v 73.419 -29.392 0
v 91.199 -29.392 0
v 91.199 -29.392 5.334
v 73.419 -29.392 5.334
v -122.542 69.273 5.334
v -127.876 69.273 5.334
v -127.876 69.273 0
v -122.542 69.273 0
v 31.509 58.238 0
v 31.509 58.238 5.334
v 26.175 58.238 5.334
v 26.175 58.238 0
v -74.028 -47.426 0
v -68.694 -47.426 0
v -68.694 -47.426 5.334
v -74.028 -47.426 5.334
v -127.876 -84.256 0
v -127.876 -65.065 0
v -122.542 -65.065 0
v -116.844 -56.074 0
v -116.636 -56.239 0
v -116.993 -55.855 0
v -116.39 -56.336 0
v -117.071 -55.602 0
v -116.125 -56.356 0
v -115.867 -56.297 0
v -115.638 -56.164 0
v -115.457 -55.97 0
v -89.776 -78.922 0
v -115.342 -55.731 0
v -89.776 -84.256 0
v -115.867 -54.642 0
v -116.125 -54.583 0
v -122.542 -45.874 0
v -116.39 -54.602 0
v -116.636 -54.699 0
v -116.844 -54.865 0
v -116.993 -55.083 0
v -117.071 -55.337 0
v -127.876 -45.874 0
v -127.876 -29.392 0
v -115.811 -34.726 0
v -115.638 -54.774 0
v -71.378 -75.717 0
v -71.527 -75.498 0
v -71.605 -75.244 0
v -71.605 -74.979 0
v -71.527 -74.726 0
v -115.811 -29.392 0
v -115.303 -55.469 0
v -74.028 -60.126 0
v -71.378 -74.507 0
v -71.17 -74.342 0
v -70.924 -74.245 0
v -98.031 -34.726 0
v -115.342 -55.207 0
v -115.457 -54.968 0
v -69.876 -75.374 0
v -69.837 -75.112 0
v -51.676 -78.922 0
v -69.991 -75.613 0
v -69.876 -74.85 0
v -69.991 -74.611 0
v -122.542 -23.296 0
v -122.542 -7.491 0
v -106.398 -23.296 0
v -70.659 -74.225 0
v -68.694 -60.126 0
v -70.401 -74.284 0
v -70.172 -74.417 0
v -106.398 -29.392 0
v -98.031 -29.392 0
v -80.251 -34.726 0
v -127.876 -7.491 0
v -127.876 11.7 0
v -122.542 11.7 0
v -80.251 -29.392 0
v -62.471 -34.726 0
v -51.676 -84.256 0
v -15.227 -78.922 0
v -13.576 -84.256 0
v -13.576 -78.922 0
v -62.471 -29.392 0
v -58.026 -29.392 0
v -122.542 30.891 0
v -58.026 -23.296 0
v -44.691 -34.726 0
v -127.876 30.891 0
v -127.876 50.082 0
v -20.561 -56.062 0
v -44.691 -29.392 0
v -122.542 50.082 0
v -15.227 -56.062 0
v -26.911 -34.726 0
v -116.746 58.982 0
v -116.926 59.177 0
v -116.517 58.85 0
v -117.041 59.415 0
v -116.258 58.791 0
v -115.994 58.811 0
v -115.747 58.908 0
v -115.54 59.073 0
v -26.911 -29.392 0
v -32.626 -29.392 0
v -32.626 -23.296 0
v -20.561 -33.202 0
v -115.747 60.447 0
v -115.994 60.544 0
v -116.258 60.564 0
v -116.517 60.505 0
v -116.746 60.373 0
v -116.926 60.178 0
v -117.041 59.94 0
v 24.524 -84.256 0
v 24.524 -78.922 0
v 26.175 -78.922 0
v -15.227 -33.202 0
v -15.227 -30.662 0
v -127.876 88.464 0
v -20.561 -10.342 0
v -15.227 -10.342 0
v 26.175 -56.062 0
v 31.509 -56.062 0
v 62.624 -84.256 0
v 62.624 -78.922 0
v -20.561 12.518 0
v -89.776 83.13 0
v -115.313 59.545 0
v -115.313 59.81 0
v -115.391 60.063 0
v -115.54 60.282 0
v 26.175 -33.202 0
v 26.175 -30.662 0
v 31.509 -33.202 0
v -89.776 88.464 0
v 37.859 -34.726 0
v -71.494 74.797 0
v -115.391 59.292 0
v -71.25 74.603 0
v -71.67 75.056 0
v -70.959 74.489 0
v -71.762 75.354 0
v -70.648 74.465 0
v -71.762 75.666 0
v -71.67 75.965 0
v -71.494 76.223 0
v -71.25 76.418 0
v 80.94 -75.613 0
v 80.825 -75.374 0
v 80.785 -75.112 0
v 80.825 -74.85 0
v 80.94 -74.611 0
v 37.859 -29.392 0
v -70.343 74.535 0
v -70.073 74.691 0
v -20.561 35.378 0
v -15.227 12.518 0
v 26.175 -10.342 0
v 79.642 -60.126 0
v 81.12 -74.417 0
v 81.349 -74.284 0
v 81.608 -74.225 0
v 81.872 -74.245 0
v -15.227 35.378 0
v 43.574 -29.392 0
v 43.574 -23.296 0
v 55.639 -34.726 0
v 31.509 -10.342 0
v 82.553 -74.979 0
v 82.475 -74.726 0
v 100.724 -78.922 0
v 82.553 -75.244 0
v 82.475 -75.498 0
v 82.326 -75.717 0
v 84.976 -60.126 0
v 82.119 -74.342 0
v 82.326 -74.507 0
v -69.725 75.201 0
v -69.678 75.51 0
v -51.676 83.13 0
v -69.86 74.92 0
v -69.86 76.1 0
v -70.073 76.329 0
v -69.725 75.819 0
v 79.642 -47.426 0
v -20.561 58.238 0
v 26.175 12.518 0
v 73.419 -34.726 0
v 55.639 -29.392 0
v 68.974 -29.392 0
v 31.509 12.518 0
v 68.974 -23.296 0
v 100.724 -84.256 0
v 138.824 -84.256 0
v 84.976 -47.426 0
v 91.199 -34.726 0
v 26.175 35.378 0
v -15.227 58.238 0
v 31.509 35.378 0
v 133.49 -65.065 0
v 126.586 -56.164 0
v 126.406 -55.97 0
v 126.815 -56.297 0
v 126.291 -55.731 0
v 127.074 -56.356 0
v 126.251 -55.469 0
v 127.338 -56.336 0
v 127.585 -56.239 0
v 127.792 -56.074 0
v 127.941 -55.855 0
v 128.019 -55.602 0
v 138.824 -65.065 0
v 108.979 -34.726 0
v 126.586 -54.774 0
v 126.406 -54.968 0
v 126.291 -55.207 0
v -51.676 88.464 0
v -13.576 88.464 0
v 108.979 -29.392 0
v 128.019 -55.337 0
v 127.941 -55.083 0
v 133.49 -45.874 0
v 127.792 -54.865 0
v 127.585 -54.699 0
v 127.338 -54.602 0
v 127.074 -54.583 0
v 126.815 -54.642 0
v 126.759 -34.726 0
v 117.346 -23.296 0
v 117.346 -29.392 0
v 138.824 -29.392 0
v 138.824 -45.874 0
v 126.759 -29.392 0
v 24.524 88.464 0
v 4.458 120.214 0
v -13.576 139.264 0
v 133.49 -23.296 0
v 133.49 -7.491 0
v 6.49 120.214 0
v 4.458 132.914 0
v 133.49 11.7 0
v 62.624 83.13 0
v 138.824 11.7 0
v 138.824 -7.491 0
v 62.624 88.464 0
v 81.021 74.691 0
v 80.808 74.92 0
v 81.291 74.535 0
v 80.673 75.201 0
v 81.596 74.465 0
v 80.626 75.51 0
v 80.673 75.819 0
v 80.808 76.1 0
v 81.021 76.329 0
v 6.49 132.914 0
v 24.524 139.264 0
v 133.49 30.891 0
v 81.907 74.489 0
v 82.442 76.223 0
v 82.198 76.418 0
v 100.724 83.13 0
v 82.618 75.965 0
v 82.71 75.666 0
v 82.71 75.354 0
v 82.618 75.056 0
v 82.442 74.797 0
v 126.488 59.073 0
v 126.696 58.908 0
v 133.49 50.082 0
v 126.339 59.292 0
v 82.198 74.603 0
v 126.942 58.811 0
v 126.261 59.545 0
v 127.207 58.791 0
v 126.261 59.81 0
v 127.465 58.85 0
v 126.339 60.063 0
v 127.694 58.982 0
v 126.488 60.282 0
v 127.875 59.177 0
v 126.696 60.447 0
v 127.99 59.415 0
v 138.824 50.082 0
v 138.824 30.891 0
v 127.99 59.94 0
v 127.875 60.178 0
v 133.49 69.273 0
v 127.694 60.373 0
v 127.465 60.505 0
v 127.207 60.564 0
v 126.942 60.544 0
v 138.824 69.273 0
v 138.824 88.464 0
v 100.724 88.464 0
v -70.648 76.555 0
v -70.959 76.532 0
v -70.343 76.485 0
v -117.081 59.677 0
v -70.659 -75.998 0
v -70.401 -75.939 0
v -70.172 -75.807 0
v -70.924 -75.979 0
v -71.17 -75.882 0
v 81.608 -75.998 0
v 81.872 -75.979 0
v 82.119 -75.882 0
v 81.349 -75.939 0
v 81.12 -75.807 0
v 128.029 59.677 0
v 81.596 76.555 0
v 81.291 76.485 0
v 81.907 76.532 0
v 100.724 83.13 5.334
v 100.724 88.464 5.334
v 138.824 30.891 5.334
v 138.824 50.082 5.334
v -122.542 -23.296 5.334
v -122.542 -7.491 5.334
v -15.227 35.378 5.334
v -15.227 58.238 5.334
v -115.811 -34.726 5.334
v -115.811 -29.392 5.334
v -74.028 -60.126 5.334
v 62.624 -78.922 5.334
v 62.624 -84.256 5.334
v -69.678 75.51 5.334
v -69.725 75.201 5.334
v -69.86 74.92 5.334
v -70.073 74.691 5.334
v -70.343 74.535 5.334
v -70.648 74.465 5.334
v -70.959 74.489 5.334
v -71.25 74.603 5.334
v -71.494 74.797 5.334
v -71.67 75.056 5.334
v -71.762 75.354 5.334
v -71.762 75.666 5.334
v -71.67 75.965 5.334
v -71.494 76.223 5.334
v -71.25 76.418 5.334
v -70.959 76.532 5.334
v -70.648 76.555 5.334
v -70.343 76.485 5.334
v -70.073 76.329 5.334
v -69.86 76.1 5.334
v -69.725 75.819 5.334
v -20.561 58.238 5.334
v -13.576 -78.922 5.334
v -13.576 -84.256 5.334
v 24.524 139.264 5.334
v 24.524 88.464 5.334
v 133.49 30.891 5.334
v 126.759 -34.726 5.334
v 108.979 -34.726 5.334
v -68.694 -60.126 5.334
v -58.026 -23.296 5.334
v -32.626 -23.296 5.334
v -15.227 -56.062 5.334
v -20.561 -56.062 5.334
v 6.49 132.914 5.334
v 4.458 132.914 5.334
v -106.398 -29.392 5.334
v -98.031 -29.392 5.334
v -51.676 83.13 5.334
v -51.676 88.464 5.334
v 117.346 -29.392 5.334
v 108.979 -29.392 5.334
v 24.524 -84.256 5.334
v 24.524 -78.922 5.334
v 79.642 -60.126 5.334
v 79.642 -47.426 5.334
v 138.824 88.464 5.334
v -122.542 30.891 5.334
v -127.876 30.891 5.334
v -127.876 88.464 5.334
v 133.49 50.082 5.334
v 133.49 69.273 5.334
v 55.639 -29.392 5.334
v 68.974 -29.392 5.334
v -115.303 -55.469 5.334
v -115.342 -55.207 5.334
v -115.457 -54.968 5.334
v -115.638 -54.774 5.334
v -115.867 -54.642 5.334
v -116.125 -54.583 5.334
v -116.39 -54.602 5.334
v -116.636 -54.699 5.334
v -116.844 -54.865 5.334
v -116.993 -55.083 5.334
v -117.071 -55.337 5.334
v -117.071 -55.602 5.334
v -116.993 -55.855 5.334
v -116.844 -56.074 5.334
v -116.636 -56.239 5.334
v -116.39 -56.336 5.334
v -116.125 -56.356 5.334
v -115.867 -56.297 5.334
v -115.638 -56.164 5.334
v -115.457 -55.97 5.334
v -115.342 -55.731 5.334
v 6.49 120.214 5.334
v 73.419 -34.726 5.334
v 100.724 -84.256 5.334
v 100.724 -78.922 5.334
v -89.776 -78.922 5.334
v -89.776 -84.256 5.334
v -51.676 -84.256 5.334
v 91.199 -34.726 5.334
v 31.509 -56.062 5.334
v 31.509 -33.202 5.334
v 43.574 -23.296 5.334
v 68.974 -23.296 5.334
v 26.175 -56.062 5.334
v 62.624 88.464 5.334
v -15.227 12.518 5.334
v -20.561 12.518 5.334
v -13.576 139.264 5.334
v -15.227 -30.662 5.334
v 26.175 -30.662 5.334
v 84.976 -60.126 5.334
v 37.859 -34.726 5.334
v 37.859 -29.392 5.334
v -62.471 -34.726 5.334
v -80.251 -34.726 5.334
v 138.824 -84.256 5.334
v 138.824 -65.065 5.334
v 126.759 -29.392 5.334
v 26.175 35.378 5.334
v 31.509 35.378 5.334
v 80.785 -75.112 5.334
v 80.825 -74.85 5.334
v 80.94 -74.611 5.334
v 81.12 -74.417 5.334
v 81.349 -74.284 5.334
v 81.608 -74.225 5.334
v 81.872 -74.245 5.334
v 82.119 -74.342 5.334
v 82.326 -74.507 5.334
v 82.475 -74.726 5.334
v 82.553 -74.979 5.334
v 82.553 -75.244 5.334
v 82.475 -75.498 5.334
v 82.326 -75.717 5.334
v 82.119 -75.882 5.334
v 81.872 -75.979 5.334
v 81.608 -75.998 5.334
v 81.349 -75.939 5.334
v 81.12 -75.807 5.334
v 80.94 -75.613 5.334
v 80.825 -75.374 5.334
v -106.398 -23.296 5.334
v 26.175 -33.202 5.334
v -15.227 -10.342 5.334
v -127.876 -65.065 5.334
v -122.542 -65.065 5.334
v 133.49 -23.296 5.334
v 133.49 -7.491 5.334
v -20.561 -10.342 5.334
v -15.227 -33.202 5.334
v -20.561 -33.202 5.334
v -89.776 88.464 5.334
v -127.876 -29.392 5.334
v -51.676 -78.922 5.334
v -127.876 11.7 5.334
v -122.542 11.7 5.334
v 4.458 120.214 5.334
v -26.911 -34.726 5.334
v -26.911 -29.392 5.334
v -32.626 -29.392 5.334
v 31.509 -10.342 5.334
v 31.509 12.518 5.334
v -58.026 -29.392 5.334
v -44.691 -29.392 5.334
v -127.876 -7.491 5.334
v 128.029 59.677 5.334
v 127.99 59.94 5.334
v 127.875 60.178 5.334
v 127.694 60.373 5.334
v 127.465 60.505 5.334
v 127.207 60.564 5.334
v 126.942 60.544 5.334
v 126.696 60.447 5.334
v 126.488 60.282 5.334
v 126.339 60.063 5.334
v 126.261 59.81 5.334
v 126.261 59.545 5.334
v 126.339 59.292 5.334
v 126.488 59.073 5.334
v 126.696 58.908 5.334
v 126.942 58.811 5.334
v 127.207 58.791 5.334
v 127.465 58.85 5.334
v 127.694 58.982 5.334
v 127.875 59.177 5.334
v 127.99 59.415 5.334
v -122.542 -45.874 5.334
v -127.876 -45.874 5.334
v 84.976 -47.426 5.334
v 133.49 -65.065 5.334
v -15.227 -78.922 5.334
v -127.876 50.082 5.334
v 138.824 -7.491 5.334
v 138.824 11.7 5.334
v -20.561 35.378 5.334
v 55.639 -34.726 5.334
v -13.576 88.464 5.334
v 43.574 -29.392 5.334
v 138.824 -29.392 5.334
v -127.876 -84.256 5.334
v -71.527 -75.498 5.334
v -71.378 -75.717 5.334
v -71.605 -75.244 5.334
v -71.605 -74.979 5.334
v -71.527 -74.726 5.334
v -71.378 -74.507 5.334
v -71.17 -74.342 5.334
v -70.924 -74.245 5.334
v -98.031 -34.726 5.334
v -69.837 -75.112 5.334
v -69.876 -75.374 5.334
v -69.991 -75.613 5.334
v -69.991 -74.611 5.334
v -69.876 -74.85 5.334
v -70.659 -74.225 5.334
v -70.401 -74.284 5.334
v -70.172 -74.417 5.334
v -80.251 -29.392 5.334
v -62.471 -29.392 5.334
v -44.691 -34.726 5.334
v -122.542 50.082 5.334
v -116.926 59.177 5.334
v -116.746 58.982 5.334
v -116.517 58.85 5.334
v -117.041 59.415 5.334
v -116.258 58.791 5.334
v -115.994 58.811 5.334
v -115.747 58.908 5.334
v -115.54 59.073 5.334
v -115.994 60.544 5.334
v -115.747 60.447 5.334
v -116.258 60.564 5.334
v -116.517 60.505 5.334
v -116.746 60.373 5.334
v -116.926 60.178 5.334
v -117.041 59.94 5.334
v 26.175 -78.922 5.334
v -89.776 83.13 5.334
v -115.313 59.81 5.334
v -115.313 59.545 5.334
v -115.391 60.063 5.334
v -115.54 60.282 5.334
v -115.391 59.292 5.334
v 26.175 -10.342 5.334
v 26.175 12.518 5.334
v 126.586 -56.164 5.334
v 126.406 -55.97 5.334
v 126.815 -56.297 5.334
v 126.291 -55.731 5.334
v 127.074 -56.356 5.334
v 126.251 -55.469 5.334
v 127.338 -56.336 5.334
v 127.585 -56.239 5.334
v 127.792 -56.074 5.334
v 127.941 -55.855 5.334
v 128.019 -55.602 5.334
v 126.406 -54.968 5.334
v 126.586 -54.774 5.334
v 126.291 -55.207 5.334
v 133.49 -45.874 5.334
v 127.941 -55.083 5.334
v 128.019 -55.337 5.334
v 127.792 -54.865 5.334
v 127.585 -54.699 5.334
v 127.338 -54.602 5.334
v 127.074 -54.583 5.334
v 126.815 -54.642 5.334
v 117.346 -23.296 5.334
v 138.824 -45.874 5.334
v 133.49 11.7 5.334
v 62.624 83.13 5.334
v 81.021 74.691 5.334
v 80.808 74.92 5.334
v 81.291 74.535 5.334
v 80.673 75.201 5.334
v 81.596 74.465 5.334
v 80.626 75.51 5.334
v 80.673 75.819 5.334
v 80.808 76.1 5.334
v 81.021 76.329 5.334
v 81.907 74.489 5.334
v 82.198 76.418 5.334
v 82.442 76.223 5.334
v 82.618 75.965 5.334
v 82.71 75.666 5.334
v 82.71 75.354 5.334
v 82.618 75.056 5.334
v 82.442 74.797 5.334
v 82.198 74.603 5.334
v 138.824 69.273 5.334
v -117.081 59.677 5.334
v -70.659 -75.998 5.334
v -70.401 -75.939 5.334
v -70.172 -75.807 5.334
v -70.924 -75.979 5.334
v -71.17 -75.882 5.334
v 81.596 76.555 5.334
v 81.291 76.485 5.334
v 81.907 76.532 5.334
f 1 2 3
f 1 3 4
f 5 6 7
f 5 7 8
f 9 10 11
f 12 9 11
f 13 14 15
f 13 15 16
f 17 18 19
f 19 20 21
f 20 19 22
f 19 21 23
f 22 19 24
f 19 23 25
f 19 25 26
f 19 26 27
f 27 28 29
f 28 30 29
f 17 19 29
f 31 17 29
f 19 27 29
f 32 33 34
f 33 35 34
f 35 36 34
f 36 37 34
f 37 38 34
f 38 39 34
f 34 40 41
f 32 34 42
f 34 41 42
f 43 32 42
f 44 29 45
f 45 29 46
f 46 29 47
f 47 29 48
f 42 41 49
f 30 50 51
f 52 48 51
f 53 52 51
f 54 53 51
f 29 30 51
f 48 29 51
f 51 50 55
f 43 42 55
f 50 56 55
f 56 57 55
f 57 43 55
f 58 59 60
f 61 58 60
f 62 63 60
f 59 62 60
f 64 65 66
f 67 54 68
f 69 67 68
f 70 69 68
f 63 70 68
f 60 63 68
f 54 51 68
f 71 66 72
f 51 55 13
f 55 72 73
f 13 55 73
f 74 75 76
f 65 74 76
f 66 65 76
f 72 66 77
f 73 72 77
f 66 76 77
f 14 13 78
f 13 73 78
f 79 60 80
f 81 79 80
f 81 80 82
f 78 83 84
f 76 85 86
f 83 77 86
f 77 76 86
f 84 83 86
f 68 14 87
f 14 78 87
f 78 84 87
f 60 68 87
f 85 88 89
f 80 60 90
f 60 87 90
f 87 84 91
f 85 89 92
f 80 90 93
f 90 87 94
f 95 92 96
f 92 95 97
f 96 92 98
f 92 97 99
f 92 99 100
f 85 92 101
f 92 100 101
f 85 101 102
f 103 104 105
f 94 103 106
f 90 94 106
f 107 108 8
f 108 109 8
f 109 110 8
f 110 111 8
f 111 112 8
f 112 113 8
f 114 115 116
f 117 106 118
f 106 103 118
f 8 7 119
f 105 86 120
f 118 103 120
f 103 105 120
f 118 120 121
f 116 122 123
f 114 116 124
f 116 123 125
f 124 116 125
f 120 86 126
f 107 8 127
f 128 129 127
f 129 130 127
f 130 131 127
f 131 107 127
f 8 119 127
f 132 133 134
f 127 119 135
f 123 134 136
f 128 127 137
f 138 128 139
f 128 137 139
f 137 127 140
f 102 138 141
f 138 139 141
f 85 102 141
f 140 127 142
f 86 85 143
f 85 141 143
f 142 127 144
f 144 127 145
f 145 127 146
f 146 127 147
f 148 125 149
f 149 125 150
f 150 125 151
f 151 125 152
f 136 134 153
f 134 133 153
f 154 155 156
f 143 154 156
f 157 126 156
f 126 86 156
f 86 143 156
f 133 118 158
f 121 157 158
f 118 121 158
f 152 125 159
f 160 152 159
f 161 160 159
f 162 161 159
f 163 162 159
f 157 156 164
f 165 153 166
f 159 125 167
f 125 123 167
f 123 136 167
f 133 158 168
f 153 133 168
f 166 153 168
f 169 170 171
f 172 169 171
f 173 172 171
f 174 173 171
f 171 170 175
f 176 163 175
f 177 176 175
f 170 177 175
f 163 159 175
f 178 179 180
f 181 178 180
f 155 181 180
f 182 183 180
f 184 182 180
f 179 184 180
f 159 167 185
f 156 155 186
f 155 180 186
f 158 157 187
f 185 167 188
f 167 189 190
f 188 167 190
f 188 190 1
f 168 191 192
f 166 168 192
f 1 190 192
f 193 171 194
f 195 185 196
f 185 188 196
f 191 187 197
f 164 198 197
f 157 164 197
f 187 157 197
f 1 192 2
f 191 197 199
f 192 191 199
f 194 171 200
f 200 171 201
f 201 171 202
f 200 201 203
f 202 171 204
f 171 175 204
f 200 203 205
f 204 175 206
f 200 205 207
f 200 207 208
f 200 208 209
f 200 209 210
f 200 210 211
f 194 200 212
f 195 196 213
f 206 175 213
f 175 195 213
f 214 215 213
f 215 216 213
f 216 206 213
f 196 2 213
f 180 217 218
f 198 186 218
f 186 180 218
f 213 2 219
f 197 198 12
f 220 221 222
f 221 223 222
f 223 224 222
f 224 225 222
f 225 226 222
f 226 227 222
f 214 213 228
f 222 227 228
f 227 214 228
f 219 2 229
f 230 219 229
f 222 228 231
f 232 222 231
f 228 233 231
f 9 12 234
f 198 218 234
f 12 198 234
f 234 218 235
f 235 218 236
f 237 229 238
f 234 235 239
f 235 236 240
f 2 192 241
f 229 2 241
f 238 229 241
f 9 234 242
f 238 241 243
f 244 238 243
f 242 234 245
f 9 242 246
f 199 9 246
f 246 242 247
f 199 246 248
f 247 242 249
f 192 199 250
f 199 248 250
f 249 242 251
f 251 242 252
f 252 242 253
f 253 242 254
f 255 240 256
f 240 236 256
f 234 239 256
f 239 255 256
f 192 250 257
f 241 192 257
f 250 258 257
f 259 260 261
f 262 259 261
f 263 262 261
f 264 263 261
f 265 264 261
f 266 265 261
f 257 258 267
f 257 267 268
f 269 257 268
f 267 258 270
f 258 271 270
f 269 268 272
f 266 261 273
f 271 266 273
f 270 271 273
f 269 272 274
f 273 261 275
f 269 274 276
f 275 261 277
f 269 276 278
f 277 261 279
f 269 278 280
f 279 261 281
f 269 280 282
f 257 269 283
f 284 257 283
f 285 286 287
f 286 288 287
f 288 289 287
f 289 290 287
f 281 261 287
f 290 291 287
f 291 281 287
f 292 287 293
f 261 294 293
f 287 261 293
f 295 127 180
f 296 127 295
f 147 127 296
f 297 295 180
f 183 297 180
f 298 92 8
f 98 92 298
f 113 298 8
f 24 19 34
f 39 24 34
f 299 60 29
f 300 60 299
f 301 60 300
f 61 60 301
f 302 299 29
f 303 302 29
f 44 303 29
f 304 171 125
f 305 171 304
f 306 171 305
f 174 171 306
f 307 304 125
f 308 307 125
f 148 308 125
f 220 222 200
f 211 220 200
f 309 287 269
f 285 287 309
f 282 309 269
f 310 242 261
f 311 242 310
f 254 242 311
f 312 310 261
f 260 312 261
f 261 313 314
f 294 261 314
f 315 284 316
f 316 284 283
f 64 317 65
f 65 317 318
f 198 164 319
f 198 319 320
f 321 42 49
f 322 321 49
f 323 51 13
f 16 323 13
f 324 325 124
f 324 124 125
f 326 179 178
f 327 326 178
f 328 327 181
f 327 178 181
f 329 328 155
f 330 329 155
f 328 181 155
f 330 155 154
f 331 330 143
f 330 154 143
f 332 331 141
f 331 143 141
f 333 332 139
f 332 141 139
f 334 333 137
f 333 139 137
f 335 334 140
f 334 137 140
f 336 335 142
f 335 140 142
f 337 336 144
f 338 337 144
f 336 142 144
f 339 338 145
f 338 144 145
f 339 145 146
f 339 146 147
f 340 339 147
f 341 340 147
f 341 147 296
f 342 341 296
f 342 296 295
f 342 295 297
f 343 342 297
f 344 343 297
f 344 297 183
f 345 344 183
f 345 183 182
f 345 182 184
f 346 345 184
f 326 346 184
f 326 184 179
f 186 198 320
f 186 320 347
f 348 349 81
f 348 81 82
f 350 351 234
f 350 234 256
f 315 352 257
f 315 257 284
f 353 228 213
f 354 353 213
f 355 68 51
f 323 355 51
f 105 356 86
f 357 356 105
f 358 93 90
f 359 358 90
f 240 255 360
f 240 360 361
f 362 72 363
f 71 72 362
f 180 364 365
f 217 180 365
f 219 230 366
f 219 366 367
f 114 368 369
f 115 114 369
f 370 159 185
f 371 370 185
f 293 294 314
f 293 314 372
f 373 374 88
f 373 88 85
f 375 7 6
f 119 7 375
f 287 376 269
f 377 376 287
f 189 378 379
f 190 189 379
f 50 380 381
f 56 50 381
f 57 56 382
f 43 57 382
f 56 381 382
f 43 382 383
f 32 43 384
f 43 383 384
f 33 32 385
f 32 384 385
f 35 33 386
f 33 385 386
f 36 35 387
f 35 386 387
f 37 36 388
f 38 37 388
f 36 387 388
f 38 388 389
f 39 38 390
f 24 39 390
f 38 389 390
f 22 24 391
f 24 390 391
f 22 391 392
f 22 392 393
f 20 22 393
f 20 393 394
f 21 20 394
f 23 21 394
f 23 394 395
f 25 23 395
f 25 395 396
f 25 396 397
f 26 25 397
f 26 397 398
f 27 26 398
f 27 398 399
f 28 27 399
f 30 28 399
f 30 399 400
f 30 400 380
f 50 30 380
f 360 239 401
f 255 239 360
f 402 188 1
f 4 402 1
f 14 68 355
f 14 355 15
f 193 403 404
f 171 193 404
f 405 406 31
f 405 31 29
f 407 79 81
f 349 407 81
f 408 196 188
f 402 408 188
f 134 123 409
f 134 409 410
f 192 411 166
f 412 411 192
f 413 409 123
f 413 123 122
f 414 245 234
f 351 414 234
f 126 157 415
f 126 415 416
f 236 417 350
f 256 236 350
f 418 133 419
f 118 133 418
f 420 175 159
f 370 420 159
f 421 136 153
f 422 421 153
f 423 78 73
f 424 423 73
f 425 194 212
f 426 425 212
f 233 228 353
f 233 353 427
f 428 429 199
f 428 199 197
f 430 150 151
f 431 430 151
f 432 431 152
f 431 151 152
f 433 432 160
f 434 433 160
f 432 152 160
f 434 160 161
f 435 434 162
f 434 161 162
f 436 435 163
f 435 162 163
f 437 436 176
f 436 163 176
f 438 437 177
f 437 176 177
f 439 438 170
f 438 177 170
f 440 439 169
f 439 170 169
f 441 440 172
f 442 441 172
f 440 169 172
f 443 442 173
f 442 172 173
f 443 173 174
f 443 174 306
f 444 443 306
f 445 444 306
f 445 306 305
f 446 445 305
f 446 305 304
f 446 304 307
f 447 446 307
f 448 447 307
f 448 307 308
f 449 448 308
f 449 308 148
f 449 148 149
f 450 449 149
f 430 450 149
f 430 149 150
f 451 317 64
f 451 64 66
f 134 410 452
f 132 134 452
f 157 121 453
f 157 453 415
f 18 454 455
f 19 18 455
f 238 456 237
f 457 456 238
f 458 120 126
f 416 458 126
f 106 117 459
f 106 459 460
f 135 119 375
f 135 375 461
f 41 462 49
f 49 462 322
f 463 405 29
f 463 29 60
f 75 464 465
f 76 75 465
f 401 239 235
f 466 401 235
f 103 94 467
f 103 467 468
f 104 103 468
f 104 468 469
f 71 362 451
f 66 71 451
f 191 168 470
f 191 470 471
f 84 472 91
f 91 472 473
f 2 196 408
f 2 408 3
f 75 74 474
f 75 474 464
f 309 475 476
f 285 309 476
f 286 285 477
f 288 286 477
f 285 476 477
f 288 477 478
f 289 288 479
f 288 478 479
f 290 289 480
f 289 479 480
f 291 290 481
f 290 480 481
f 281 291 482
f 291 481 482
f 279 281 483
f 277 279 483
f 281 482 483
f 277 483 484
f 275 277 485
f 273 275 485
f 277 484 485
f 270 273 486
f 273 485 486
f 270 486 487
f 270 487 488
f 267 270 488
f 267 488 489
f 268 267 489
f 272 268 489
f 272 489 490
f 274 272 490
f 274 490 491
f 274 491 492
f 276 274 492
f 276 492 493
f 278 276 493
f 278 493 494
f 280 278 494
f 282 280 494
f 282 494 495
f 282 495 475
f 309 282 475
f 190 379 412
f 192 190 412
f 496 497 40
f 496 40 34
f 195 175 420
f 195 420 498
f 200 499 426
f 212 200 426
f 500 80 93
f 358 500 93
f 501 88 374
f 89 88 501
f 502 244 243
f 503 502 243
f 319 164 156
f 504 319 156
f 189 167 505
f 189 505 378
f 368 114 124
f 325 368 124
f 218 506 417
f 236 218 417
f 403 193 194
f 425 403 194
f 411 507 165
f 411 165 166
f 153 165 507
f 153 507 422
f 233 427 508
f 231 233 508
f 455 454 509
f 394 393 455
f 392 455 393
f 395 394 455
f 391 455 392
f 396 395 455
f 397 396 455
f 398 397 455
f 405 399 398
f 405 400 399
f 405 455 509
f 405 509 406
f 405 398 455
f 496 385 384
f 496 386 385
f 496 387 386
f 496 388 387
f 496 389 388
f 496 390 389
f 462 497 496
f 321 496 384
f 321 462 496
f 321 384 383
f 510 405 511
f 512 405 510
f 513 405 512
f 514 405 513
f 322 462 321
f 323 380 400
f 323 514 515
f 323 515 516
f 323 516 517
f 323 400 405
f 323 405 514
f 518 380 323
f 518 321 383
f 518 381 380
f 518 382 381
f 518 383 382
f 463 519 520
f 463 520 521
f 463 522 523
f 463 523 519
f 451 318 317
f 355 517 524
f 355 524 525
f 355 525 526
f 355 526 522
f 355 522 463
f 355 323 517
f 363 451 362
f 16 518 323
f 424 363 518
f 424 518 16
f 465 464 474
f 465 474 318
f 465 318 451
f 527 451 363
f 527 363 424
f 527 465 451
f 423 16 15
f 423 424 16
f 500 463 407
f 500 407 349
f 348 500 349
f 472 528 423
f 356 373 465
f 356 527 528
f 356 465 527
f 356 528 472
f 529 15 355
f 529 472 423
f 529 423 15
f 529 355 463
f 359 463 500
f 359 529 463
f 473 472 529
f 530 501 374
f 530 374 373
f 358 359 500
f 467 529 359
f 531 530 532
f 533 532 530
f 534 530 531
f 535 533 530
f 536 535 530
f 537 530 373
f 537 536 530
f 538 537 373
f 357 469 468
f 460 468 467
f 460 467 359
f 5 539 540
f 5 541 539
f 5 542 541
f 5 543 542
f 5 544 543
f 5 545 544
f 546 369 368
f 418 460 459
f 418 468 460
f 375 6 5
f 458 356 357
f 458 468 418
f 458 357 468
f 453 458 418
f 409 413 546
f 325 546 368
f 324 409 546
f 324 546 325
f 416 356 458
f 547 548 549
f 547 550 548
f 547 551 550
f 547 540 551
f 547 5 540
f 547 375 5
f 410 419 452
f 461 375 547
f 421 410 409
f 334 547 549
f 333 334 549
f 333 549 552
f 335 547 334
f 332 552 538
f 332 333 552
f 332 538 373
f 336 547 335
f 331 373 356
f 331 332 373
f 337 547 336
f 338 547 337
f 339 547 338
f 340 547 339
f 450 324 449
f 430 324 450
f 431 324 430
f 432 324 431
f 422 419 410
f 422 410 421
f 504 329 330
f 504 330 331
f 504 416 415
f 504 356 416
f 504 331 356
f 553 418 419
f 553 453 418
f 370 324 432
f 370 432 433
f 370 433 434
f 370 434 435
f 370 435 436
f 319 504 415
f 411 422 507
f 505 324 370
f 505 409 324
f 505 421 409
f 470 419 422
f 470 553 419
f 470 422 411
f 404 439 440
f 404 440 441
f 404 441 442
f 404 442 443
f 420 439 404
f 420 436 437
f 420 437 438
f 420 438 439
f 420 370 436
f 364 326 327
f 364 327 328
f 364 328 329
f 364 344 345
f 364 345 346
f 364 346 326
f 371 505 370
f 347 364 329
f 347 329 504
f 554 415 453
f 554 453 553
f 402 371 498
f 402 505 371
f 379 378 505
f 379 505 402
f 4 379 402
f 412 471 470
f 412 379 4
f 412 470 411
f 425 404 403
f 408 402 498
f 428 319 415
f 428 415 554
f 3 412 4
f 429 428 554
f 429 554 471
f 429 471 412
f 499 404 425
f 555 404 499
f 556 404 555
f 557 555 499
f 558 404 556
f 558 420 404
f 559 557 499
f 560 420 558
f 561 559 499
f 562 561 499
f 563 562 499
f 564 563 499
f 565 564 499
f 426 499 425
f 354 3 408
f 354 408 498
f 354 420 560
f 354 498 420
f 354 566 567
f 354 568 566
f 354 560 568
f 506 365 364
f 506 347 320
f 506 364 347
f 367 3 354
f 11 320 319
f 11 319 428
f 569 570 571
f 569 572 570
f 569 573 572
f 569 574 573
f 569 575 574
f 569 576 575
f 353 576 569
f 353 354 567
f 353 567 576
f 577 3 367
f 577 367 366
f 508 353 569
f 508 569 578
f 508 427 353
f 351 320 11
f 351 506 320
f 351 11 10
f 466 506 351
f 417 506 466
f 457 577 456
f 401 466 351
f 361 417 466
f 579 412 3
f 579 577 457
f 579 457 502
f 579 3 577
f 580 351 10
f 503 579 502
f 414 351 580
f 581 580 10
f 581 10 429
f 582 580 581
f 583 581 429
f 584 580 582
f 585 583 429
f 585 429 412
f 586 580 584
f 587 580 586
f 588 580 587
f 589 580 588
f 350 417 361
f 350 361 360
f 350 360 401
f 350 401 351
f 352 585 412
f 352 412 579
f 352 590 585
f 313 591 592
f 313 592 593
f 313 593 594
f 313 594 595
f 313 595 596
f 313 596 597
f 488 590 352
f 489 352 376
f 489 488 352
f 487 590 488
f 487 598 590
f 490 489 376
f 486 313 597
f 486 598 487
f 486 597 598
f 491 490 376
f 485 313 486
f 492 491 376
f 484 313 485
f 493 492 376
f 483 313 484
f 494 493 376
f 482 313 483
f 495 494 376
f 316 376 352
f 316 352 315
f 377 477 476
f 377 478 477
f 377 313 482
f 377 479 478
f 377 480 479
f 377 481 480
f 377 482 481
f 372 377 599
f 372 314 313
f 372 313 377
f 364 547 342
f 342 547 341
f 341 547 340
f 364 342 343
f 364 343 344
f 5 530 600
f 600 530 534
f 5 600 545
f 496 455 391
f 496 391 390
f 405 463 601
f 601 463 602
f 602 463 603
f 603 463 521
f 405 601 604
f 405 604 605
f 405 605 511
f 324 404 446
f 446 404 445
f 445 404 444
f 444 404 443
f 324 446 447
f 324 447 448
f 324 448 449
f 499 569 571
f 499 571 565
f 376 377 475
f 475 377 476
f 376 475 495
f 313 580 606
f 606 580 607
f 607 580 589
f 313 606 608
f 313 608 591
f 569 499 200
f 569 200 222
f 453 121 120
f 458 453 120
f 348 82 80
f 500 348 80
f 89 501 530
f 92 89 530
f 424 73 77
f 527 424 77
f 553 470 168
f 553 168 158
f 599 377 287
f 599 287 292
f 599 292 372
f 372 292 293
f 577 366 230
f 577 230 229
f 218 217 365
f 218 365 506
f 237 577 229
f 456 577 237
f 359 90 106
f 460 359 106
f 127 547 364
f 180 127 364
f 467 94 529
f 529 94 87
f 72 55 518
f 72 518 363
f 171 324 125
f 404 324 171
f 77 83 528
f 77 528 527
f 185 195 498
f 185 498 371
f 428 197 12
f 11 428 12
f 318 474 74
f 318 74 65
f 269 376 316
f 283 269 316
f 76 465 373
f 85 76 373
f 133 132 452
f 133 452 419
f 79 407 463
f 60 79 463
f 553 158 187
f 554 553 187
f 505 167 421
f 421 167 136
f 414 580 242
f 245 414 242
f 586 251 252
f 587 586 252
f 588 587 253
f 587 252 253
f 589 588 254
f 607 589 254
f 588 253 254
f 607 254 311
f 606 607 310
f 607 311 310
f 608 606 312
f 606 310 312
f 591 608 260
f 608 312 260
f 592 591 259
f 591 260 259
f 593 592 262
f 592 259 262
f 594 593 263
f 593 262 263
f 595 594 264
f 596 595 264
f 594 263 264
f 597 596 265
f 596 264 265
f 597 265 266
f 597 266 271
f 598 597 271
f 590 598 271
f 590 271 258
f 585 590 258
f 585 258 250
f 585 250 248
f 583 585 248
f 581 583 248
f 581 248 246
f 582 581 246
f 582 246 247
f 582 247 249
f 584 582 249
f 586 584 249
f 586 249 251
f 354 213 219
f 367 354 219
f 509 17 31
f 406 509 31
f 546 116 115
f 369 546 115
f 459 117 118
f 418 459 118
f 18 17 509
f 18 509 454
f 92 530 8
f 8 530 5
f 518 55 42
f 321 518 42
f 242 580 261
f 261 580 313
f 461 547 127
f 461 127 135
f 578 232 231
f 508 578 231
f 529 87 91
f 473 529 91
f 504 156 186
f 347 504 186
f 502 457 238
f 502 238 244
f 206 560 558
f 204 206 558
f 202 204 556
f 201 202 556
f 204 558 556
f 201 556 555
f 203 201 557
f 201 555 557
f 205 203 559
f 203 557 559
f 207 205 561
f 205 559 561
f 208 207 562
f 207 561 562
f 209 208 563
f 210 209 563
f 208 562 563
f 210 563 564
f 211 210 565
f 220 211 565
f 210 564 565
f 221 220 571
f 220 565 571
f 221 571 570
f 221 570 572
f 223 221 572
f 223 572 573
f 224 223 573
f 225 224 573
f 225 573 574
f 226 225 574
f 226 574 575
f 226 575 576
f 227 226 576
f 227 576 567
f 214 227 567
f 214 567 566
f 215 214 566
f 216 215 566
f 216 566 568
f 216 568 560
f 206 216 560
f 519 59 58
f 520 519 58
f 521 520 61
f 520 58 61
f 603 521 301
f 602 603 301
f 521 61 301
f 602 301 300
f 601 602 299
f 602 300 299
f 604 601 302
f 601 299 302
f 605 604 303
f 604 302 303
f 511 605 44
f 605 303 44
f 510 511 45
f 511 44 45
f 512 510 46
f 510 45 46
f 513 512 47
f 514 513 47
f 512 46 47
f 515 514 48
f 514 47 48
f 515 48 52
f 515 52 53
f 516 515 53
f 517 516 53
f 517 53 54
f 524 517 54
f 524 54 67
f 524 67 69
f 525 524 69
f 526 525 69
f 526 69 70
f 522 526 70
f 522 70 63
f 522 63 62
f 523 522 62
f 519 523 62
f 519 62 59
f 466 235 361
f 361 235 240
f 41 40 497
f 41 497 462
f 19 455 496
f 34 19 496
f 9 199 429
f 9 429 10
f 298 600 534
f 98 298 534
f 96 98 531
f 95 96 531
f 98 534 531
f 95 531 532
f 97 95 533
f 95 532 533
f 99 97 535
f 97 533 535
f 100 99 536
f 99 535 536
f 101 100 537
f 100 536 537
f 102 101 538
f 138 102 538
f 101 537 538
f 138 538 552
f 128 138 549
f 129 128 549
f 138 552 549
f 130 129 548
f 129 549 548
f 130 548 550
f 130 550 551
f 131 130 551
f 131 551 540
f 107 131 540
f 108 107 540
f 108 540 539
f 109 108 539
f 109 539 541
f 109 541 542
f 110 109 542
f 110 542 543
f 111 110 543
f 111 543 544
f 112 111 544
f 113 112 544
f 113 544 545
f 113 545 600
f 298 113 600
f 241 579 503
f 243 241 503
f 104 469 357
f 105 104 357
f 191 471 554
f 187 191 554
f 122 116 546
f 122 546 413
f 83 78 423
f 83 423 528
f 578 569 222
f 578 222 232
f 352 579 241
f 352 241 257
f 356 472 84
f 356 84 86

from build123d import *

# Parameters (mm, degrees)
SKETCH1_W           = 266.7
SKETCH1_H           = 172.72
BOSS_EXTRUDE1_DEPTH = 5.334
SKETCH2_W           = 38.1
SKETCH2_H           = 5.334
CUT_EXTRUDE1_DEPTH  = 165.701204222
SKETCH5_W           = 25.4
SKETCH5_H           = 6.096
SKETCH5_W_2         = 21.477624924
SKETCH5_W_3         = 21.477624925
CUT_EXTRUDE3_DEPTH  = 165.701204222
SKETCH9_W           = 5.334
SKETCH9_H           = 19.191111111
CUT_EXTRUDE7_DEPTH  = 165.701204222
SKETCH10_W          = 38.1
SKETCH10_H          = 5.334
BOSS_EXTRUDE2_DEPTH = 50.8
SKETCH11_W          = 6.604
SKETCH11_H          = 40.64
CUT_EXTRUDE8_DEPTH  = 197.710659379
SKETCH12_R          = 3.81
CUT_EXTRUDE9_DEPTH  = 197.710659379
SKETCH15_W          = 6.604
SKETCH15_H          = 10.16
CUT_EXTRUDE12_DEPTH = 197.710659379
SKETCH18_W          = 38.1
SKETCH18_H          = 56.134
BOSS_EXTRUDE3_DEPTH = 5.334
SKETCH19_W          = 34.756768033
SKETCH19_H          = 54.94363668
CUT_EXTRUDE15_DEPTH = 197.710659379
SKETCH21_R          = 0.889
CUT_EXTRUDE17_DEPTH = 197.710659379
SKETCH23_R          = 1.04775
CUT_EXTRUDE19_DEPTH = 197.710659379
SKETCH25_W          = 17.78
SKETCH25_H          = 5.334
CUT_EXTRUDE20_DEPTH = 197.710659379
SKETCH26_W          = 5.334
SKETCH26_H          = 12.7
CUT_EXTRUDE21_DEPTH = 197.710659379
SKETCH27_W          = 41.402
SKETCH27_H          = 48.26
CUT_EXTRUDE22_DEPTH = 197.710659379
SKETCH28_W          = 5.334
SKETCH28_H          = 22.86
CUT_EXTRUDE23_DEPTH = 197.710659379
SKETCH29_R          = 0.889
CUT_EXTRUDE24_DEPTH = 197.710659379
SKETCH30_W          = 2.032
SKETCH30_H          = 12.7
CUT_EXTRUDE25_DEPTH = 197.710659379


with BuildPart() as part:
    # Sketch1 → Boss-Extrude1 (new body)
    with BuildSketch(Plane.XY):
        with Locations((5.474099752, 2.104142138)):
            Rectangle(SKETCH1_W, SKETCH1_H)
    extrude(amount=BOSS_EXTRUDE1_DEPTH)

    # Sketch2 → Cut-Extrude1 (cut, through all)
    with BuildSketch(Plane.XY.offset(5.334)):
        with Locations((-70.725900248, -81.588857862)):
            Rectangle(SKETCH2_W, SKETCH2_H)
        with Locations((5.474099752, -81.588857862)):
            Rectangle(SKETCH2_W, SKETCH2_H)
        with Locations((81.674099752, -81.588857862)):
            Rectangle(SKETCH2_W, SKETCH2_H)
        with Locations((81.674099752, 85.797142138)):
            Rectangle(SKETCH2_W, SKETCH2_H)
        with Locations((5.474099752, 85.797142138)):
            Rectangle(SKETCH2_W, SKETCH2_H)
        with Locations((-70.725900248, 85.797142138)):
            Rectangle(SKETCH2_W, SKETCH2_H)
    extrude(amount=-CUT_EXTRUDE1_DEPTH, mode=Mode.SUBTRACT)

    # Sketch5 → Cut-Extrude3 (cut, through all)
    with BuildSketch(Plane.XY.offset(5.334)):
        with Locations((56.274099752, -26.343857862)):
            Rectangle(SKETCH5_W, SKETCH5_H)
        with Locations((-45.325900248, -26.343857862)):
            Rectangle(SKETCH5_W, SKETCH5_H)
        with Locations((-117.137087786, -26.343857862)):
            Rectangle(SKETCH5_W_2, SKETCH5_H)
        with Locations((128.08528729, -26.343857862)):
            Rectangle(SKETCH5_W_3, SKETCH5_H)
    extrude(amount=-CUT_EXTRUDE3_DEPTH, mode=Mode.SUBTRACT)

    # Sketch9 → Cut-Extrude7 (cut, through all)
    with BuildSketch(Plane.XY.offset(5.334)):
        with Locations((-125.208900248, -55.469191196)):
            Rectangle(SKETCH9_W, SKETCH9_H)
        with Locations((-125.208900248, -17.086968973)):
            Rectangle(SKETCH9_W, SKETCH9_H)
        with Locations((-125.208900248, 21.295253249)):
            Rectangle(SKETCH9_W, SKETCH9_H)
        with Locations((-125.208900248, 59.677475472)):
            Rectangle(SKETCH9_W, SKETCH9_H)
        with Locations((136.157099752, 59.677475472)):
            Rectangle(SKETCH9_W, SKETCH9_H)
        with Locations((136.157099752, 21.295253249)):
            Rectangle(SKETCH9_W, SKETCH9_H)
        with Locations((136.157099752, -17.086968973)):
            Rectangle(SKETCH9_W, SKETCH9_H)
        with Locations((136.157099752, -55.469191196)):
            Rectangle(SKETCH9_W, SKETCH9_H)
    extrude(amount=-CUT_EXTRUDE7_DEPTH, mode=Mode.SUBTRACT)

    # Sketch10 → Boss-Extrude2 (add)
    with BuildSketch(Plane(origin=(0, 88.464142138, 0), x_dir=(1, 0, 0), z_dir=(0, 1, 0))):
        with Locations((43.574099752, -2.667)):
            Rectangle(SKETCH10_W, SKETCH10_H)
    extrude(amount=BOSS_EXTRUDE2_DEPTH)

    # Sketch11 → Cut-Extrude8 (cut, through all)
    with BuildSketch(Plane(origin=(0, 0, 0), x_dir=(-1, 0, 0), z_dir=(0, 0, -1))):
        with Locations((-27.826099752, 108.784142138)):
            Rectangle(SKETCH11_W, SKETCH11_H)
    extrude(amount=-CUT_EXTRUDE8_DEPTH, mode=Mode.SUBTRACT)

    # Sketch12 → Cut-Extrude9 (cut, through all)
    with BuildSketch(Plane.XY.offset(5.334)):
        with Locations((43.574099752, 130.476471297)):
            Circle(SKETCH12_R)
    extrude(amount=-CUT_EXTRUDE9_DEPTH, mode=Mode.SUBTRACT)

    # Sketch15 → Cut-Extrude12 (cut, through all)
    with BuildSketch(Plane.XY.offset(5.334)):
        with Locations((27.826099752, 134.184142138)):
            Rectangle(SKETCH15_W, SKETCH15_H)
    extrude(amount=-CUT_EXTRUDE12_DEPTH, mode=Mode.SUBTRACT)

    # Sketch18 → Boss-Extrude3 (add)
    with BuildSketch(Plane.XY.offset(5.334)):
        with Locations((5.474099752, 111.197142138)):
            Rectangle(SKETCH18_W, SKETCH18_H)
    extrude(amount=-BOSS_EXTRUDE3_DEPTH)

    # Sketch19 → Cut-Extrude15 (cut, through all)
    with BuildSketch(Plane.XY.offset(5.334)):
        with Locations((48.506483768, 115.935960478)):
            Rectangle(SKETCH19_W, SKETCH19_H)
    extrude(amount=-CUT_EXTRUDE15_DEPTH, mode=Mode.SUBTRACT)

    # Sketch21 → Cut-Extrude17 (cut, through all)
    with BuildSketch(Plane.XY.offset(5.334)):
        with Locations((127.140099752, 59.677475471)):
            Circle(SKETCH21_R)
        with Locations(Location((-116.191900248, 59.677475471, 0), (0, 0, 180))):
            Circle(SKETCH21_R)
        with Locations((-116.191900248, -55.469191196)):
            Circle(SKETCH21_R)
        with Locations(Location((127.140099752, -55.469191196, 0), (0, 0, 180))):
            Circle(SKETCH21_R)
    extrude(amount=-CUT_EXTRUDE17_DEPTH, mode=Mode.SUBTRACT)

    # Sketch23 → Cut-Extrude19 (cut, through all)
    with BuildSketch(Plane(origin=(0, 0, 0), x_dir=(-1, 0, 0), z_dir=(0, 0, -1))):
        with Locations((-81.674099752, 75.510142138)):
            Circle(SKETCH23_R)
        with Locations(Location((70.725900248, 75.510142138, 0), (0, 0, 180))):
            Circle(SKETCH23_R)
    extrude(amount=-CUT_EXTRUDE19_DEPTH, mode=Mode.SUBTRACT)

    # Sketch25 → Cut-Extrude20 (cut, through all)
    with BuildSketch(Plane(origin=(0, 0, 0), x_dir=(-1, 0, 0), z_dir=(0, 0, -1))):
        with Locations((-117.869099752, -32.058857862)):
            Rectangle(SKETCH25_W, SKETCH25_H)
        with Locations((-82.309099752, -32.058857862)):
            Rectangle(SKETCH25_W, SKETCH25_H)
        with Locations((-46.749099752, -32.058857862)):
            Rectangle(SKETCH25_W, SKETCH25_H)
        with Locations((35.800900248, -32.058857862)):
            Rectangle(SKETCH25_W, SKETCH25_H)
        with Locations((106.920900248, -32.058857862)):
            Rectangle(SKETCH25_W, SKETCH25_H)
        with Locations((71.360900248, -32.058857862)):
            Rectangle(SKETCH25_W, SKETCH25_H)
    extrude(amount=-CUT_EXTRUDE20_DEPTH, mode=Mode.SUBTRACT)

    # Sketch26 → Cut-Extrude21 (cut, through all)
    with BuildSketch(Plane(origin=(0, 0, 0), x_dir=(-1, 0, 0), z_dir=(0, 0, -1))):
        with Locations((-82.309099752, -53.775857862)):
            Rectangle(SKETCH26_W, SKETCH26_H)
        with Locations((71.360900248, -53.775857862)):
            Rectangle(SKETCH26_W, SKETCH26_H)
    extrude(amount=-CUT_EXTRUDE21_DEPTH, mode=Mode.SUBTRACT)

    # Sketch27 → Cut-Extrude22 (cut, through all)
    with BuildSketch(Plane(origin=(0, 0, 0), x_dir=(-1, 0, 0), z_dir=(0, 0, -1))):
        with Locations((-5.474099752, -54.791857862)):
            Rectangle(SKETCH27_W, SKETCH27_H)
    extrude(amount=-CUT_EXTRUDE22_DEPTH, mode=Mode.SUBTRACT)

    # Sketch28 → Cut-Extrude23 (cut, through all)
    with BuildSketch(Plane(origin=(0, 0, 0), x_dir=(-1, 0, 0), z_dir=(0, 0, -1))):
        with Locations((-28.842099752, -44.631857862)):
            Rectangle(SKETCH28_W, SKETCH28_H)
        with Locations((-28.842099752, 1.088142138)):
            Rectangle(SKETCH28_W, SKETCH28_H)
        with Locations((-28.842099752, 46.808142138)):
            Rectangle(SKETCH28_W, SKETCH28_H)
        with Locations((17.893900248, 46.808142138)):
            Rectangle(SKETCH28_W, SKETCH28_H)
        with Locations((17.893900248, 1.088142138)):
            Rectangle(SKETCH28_W, SKETCH28_H)
        with Locations((17.893900248, -44.631857862)):
            Rectangle(SKETCH28_W, SKETCH28_H)
    extrude(amount=-CUT_EXTRUDE23_DEPTH, mode=Mode.SUBTRACT)

    # Sketch29 → Cut-Extrude24 (cut, through all)
    with BuildSketch(Plane(origin=(0, 0, 0), x_dir=(-1, 0, 0), z_dir=(0, 0, -1))):
        with Locations((-81.674099752, -75.111857862)):
            Circle(SKETCH29_R)
        with Locations(Location((70.725900248, -75.111857862, 0), (0, 0, 180))):
            Circle(SKETCH29_R)
    extrude(amount=-CUT_EXTRUDE24_DEPTH, mode=Mode.SUBTRACT)

    # Sketch30 → Cut-Extrude25 (cut, through all)
    with BuildSketch(Plane(origin=(0, 0, 0), x_dir=(-1, 0, 0), z_dir=(0, 0, -1))):
        with Locations((-5.474099752, 126.564142138)):
            Rectangle(SKETCH30_W, SKETCH30_H)
    extrude(amount=-CUT_EXTRUDE25_DEPTH, mode=Mode.SUBTRACT)


solid = part.part
